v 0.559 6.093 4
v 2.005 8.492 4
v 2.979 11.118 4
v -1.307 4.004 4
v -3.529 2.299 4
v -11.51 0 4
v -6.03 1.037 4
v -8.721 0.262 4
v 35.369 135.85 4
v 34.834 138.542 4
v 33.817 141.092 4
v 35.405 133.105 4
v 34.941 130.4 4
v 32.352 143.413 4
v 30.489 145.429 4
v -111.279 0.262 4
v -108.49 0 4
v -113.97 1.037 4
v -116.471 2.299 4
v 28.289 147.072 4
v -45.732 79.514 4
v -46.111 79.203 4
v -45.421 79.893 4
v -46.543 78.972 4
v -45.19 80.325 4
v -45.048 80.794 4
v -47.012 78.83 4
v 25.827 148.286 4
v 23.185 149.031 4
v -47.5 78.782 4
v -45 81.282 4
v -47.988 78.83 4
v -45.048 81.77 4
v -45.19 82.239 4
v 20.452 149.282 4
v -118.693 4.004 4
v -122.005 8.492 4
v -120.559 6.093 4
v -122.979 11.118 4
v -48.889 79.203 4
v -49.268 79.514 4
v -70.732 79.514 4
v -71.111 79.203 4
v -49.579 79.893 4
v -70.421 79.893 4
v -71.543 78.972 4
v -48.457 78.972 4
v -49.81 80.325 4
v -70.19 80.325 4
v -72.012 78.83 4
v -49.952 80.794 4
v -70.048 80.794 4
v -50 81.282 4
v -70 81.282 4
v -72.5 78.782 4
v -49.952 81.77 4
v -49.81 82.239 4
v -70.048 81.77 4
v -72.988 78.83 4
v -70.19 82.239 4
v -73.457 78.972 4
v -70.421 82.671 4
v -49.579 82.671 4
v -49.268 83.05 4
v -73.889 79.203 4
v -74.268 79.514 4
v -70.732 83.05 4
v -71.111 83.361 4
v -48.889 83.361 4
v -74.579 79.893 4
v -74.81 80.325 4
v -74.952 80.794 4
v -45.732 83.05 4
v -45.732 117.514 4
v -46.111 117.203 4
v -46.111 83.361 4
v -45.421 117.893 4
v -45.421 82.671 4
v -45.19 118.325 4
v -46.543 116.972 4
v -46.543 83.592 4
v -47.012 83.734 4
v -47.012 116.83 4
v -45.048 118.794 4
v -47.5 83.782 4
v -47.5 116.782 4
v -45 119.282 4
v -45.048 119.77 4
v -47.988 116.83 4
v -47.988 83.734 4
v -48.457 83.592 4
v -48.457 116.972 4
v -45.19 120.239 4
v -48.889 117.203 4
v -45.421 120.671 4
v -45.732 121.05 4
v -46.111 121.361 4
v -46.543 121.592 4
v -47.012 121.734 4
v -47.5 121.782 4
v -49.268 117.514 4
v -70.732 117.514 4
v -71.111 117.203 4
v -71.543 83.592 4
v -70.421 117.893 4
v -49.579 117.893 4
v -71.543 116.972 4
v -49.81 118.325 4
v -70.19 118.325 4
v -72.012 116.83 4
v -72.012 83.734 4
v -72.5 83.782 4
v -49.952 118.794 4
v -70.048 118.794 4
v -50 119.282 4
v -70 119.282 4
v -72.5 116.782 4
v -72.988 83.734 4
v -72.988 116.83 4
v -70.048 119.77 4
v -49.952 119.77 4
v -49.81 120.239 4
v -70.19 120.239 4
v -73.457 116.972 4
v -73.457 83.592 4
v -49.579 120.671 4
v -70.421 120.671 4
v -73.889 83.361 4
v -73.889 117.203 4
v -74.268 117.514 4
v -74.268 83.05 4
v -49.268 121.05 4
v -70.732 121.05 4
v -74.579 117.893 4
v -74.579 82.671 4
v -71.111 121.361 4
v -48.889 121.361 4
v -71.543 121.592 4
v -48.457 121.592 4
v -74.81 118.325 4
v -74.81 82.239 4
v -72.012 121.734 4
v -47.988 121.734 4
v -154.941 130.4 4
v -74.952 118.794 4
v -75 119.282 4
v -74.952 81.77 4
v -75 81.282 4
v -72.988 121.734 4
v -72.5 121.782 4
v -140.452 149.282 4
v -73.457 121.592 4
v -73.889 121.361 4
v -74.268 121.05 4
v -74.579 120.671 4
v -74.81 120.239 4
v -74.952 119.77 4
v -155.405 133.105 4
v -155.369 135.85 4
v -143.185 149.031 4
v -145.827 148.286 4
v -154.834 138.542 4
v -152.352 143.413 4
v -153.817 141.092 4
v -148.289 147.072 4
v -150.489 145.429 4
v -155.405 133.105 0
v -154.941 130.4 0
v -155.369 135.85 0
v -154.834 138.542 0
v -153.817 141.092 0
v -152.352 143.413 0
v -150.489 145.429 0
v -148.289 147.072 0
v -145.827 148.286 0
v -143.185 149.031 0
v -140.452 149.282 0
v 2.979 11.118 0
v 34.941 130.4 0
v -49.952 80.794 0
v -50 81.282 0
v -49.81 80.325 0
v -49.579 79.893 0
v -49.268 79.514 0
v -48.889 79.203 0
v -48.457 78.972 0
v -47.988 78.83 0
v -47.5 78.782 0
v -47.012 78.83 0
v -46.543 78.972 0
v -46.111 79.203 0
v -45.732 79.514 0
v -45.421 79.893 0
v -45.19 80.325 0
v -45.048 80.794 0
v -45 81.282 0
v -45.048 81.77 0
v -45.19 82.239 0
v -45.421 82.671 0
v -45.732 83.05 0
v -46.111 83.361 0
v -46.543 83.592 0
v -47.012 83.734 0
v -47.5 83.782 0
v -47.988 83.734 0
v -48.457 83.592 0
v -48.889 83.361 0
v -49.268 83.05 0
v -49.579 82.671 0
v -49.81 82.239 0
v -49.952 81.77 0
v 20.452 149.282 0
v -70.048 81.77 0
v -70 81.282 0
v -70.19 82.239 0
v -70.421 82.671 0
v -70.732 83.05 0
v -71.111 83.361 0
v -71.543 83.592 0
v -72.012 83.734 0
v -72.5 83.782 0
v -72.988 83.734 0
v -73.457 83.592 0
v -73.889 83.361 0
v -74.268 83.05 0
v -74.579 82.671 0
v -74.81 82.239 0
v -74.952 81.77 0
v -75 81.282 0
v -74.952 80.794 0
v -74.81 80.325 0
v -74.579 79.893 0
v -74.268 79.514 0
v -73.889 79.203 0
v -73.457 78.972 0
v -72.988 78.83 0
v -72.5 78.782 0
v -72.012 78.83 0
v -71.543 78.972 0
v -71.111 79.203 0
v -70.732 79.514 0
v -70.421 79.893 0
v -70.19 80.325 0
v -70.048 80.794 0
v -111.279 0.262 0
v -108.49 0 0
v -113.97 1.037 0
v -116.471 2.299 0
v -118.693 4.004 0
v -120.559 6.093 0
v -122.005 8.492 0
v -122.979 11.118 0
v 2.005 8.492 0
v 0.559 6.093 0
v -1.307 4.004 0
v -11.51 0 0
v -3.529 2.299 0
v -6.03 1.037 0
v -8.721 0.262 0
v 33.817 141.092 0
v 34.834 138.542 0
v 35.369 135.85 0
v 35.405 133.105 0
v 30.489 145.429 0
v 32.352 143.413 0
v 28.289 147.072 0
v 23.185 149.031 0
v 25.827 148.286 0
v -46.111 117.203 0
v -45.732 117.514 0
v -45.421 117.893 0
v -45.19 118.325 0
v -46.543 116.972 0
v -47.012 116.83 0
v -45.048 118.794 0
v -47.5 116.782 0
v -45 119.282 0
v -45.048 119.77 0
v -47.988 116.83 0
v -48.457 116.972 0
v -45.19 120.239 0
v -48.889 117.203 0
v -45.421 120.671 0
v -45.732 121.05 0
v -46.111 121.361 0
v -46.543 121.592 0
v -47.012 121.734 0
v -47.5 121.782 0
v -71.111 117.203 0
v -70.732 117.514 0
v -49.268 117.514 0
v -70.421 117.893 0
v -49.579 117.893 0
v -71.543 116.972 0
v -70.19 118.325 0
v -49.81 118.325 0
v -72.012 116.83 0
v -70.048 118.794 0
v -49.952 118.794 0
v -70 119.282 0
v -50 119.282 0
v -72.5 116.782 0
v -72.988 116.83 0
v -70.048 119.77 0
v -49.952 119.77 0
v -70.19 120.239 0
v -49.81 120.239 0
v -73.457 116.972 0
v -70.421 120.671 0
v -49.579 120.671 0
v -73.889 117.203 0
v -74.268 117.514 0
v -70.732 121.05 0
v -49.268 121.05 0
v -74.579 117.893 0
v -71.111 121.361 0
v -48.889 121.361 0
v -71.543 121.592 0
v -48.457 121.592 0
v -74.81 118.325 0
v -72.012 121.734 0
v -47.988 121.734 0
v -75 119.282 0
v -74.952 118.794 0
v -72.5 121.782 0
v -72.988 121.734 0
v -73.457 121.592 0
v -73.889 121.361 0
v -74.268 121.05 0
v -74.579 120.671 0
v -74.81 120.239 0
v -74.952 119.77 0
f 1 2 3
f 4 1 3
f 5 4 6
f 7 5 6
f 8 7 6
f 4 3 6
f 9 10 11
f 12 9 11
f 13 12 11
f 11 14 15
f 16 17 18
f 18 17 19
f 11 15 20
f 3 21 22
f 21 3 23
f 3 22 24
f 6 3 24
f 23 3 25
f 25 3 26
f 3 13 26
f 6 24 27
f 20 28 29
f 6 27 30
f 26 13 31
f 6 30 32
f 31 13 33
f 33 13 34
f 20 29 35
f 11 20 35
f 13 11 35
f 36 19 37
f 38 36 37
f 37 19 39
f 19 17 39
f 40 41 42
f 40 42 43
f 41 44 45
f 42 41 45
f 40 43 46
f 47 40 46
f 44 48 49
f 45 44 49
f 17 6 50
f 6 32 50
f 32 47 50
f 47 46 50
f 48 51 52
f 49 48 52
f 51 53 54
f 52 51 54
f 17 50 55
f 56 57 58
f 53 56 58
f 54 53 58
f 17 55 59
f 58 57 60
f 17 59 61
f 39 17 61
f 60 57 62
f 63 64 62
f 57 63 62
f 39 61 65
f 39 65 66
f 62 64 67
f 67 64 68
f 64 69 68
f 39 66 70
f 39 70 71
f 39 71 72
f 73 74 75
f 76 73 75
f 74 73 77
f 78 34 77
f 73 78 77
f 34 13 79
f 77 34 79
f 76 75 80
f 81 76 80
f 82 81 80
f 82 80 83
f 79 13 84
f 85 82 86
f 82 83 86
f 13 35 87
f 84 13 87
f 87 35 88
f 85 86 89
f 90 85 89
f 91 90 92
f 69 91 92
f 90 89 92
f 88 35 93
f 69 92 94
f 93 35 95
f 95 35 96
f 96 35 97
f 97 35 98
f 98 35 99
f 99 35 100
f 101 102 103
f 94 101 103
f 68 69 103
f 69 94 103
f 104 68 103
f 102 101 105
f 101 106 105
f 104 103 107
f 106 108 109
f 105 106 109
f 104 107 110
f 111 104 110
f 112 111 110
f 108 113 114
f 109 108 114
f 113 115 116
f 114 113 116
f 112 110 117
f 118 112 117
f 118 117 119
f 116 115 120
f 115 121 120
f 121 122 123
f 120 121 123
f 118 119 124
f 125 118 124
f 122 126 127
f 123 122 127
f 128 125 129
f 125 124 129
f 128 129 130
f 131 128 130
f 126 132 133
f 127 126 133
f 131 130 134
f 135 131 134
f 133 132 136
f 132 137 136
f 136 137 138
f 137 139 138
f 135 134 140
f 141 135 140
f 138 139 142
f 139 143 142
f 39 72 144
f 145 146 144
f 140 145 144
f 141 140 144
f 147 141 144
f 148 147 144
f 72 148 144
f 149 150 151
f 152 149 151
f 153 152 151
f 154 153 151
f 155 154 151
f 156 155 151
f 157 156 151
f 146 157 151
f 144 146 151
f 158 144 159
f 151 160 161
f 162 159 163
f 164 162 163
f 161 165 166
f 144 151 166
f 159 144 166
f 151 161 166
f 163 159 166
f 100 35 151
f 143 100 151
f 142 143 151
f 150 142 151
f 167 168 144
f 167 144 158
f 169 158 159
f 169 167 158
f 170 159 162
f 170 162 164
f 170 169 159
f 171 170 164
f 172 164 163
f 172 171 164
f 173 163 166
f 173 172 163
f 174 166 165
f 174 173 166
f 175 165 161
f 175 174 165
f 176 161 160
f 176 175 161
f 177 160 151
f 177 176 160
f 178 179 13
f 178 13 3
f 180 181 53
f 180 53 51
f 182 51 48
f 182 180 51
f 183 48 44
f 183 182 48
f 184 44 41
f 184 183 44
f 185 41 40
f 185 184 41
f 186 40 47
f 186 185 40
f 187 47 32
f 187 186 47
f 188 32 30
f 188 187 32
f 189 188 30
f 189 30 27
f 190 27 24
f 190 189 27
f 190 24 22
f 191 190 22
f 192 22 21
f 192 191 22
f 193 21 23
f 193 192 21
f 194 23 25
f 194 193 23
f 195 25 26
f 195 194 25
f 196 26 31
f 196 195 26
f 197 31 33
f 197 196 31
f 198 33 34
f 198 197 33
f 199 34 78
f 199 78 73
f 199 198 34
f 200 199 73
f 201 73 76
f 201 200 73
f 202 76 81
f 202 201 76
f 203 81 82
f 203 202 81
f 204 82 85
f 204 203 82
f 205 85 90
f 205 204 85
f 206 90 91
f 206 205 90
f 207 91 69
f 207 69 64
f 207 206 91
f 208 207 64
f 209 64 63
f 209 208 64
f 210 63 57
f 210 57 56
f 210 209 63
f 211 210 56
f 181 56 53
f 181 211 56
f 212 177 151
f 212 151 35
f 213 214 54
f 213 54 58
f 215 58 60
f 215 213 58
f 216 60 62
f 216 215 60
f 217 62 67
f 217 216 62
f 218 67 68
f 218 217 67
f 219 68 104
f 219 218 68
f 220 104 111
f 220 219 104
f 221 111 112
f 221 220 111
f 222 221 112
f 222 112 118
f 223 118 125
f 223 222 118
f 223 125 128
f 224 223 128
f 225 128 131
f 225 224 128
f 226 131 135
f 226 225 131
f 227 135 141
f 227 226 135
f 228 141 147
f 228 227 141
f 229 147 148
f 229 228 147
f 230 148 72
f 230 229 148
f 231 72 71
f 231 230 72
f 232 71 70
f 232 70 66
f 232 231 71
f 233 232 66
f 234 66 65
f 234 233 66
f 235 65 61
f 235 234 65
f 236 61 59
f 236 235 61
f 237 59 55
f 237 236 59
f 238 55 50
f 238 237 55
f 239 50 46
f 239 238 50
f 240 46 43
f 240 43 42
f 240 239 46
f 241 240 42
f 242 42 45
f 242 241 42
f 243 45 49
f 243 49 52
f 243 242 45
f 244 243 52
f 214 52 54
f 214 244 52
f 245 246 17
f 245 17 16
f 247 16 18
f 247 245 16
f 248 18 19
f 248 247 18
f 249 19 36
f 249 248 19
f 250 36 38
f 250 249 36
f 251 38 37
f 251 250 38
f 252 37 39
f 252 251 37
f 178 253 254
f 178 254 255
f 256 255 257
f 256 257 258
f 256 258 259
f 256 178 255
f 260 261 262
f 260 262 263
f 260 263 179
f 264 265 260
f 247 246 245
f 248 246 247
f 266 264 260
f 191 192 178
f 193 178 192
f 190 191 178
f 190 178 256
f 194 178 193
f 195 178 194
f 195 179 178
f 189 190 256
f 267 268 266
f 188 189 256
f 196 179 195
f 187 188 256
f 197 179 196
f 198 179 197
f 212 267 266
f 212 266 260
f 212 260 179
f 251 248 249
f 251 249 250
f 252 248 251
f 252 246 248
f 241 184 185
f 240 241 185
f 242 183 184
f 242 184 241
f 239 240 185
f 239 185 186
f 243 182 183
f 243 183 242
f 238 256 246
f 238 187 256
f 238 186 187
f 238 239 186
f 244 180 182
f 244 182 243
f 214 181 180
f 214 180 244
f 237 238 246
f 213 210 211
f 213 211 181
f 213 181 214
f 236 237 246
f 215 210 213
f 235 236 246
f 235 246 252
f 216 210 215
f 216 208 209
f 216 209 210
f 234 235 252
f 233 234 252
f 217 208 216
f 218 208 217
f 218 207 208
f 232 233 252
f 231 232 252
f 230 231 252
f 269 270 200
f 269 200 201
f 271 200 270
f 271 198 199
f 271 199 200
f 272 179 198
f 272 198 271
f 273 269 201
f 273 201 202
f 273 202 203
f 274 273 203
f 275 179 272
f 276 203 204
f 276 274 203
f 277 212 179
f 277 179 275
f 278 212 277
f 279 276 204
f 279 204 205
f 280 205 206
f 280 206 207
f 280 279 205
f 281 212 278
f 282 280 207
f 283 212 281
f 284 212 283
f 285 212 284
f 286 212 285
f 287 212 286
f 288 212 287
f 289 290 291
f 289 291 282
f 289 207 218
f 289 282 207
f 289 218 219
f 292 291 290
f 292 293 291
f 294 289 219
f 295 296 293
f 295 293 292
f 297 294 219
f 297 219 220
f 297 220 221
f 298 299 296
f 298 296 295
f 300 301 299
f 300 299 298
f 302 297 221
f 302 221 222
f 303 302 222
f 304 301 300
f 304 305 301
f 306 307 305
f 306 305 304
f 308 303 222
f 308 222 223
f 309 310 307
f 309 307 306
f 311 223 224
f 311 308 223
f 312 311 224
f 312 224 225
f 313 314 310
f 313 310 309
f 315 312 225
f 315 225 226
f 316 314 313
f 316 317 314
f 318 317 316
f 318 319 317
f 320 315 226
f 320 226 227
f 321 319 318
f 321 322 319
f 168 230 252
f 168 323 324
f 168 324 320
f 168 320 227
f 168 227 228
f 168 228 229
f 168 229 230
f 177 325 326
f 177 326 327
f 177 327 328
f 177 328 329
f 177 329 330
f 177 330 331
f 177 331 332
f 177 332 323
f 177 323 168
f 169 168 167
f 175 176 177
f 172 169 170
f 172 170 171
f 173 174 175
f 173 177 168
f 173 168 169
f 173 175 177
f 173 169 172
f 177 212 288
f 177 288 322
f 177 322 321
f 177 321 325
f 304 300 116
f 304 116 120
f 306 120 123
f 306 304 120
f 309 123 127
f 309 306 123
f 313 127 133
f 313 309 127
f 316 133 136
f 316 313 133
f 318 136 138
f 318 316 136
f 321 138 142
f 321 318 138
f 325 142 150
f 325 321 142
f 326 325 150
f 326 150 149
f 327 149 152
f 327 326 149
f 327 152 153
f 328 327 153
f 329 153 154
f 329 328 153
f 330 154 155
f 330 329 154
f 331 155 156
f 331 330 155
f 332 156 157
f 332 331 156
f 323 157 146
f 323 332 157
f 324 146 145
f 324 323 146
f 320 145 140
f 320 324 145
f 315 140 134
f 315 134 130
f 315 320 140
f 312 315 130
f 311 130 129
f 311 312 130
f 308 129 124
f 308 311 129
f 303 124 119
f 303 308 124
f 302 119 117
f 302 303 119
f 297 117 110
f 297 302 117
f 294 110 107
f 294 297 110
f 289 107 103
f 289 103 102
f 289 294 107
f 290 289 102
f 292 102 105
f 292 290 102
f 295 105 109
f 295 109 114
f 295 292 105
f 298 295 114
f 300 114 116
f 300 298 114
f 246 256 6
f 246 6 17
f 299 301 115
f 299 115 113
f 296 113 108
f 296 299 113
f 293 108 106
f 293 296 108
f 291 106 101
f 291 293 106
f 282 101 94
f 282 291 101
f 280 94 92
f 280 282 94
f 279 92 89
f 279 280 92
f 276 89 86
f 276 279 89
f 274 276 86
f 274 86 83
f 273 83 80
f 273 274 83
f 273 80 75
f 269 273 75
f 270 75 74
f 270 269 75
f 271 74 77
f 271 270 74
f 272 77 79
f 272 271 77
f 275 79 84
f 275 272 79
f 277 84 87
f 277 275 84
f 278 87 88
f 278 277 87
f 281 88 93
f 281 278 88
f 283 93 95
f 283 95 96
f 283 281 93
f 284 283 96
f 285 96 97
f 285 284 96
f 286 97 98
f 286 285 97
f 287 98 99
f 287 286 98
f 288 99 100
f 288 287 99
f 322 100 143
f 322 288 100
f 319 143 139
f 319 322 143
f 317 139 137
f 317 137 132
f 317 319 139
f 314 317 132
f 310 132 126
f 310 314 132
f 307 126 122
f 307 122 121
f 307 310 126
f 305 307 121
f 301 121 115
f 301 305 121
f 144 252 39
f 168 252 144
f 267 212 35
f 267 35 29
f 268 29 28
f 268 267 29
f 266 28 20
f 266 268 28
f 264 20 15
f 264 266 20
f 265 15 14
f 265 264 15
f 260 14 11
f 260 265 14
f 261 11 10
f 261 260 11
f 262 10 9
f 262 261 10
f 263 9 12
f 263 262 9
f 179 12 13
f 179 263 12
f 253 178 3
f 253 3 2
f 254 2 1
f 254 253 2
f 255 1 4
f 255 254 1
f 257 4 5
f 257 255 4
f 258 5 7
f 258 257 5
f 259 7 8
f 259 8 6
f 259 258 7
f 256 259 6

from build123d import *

# Parameters (mm, degrees)
SKETCH_1_R      = 2.5
EXTRUDE_1_DEPTH = 4


with BuildPart() as part:
    # 草图1 → 凸台-拉伸1 (new body)
    with BuildSketch(Plane.XY):
        with BuildLine():
            Line((-11.50990482, 0), (-108.49009518, 0))
            ThreePointArc((-108.49009518, 0), (-117.621516615, 3.099699896), (-122.978982575, 11.117714323))
            Line((-122.978982575, 11.117714323), (-154.940506802, 130.399746626))
            ThreePointArc((-154.940506802, 130.399746626), (-152.351919512, 143.413453738), (-140.451619407, 149.282032303))
            Line((-140.451619407, 149.282032303), (20.451619407, 149.282032303))
            ThreePointArc((20.451619407, 149.282032303), (32.351919512, 143.413453738), (34.940506802, 130.399746626))
            Line((34.940506802, 130.399746626), (2.978982575, 11.117714323))
            ThreePointArc((2.978982575, 11.117714323), (-2.378483385, 3.099699896), (-11.50990482, 0))
        make_face()
        with Locations((-72.5, 81.282032303)):
            Circle(SKETCH_1_R, mode=Mode.SUBTRACT)
        with Locations((-72.5, 119.282032303)):
            Circle(SKETCH_1_R, mode=Mode.SUBTRACT)
        with Locations(Location((-47.5, 81.282032303, 0), (0, 0, 180))):
            Circle(SKETCH_1_R, mode=Mode.SUBTRACT)
        with Locations(Location((-47.5, 119.282032303, 0), (0, 0, 180))):
            Circle(SKETCH_1_R, mode=Mode.SUBTRACT)
    extrude(amount=EXTRUDE_1_DEPTH)


solid = part.part
